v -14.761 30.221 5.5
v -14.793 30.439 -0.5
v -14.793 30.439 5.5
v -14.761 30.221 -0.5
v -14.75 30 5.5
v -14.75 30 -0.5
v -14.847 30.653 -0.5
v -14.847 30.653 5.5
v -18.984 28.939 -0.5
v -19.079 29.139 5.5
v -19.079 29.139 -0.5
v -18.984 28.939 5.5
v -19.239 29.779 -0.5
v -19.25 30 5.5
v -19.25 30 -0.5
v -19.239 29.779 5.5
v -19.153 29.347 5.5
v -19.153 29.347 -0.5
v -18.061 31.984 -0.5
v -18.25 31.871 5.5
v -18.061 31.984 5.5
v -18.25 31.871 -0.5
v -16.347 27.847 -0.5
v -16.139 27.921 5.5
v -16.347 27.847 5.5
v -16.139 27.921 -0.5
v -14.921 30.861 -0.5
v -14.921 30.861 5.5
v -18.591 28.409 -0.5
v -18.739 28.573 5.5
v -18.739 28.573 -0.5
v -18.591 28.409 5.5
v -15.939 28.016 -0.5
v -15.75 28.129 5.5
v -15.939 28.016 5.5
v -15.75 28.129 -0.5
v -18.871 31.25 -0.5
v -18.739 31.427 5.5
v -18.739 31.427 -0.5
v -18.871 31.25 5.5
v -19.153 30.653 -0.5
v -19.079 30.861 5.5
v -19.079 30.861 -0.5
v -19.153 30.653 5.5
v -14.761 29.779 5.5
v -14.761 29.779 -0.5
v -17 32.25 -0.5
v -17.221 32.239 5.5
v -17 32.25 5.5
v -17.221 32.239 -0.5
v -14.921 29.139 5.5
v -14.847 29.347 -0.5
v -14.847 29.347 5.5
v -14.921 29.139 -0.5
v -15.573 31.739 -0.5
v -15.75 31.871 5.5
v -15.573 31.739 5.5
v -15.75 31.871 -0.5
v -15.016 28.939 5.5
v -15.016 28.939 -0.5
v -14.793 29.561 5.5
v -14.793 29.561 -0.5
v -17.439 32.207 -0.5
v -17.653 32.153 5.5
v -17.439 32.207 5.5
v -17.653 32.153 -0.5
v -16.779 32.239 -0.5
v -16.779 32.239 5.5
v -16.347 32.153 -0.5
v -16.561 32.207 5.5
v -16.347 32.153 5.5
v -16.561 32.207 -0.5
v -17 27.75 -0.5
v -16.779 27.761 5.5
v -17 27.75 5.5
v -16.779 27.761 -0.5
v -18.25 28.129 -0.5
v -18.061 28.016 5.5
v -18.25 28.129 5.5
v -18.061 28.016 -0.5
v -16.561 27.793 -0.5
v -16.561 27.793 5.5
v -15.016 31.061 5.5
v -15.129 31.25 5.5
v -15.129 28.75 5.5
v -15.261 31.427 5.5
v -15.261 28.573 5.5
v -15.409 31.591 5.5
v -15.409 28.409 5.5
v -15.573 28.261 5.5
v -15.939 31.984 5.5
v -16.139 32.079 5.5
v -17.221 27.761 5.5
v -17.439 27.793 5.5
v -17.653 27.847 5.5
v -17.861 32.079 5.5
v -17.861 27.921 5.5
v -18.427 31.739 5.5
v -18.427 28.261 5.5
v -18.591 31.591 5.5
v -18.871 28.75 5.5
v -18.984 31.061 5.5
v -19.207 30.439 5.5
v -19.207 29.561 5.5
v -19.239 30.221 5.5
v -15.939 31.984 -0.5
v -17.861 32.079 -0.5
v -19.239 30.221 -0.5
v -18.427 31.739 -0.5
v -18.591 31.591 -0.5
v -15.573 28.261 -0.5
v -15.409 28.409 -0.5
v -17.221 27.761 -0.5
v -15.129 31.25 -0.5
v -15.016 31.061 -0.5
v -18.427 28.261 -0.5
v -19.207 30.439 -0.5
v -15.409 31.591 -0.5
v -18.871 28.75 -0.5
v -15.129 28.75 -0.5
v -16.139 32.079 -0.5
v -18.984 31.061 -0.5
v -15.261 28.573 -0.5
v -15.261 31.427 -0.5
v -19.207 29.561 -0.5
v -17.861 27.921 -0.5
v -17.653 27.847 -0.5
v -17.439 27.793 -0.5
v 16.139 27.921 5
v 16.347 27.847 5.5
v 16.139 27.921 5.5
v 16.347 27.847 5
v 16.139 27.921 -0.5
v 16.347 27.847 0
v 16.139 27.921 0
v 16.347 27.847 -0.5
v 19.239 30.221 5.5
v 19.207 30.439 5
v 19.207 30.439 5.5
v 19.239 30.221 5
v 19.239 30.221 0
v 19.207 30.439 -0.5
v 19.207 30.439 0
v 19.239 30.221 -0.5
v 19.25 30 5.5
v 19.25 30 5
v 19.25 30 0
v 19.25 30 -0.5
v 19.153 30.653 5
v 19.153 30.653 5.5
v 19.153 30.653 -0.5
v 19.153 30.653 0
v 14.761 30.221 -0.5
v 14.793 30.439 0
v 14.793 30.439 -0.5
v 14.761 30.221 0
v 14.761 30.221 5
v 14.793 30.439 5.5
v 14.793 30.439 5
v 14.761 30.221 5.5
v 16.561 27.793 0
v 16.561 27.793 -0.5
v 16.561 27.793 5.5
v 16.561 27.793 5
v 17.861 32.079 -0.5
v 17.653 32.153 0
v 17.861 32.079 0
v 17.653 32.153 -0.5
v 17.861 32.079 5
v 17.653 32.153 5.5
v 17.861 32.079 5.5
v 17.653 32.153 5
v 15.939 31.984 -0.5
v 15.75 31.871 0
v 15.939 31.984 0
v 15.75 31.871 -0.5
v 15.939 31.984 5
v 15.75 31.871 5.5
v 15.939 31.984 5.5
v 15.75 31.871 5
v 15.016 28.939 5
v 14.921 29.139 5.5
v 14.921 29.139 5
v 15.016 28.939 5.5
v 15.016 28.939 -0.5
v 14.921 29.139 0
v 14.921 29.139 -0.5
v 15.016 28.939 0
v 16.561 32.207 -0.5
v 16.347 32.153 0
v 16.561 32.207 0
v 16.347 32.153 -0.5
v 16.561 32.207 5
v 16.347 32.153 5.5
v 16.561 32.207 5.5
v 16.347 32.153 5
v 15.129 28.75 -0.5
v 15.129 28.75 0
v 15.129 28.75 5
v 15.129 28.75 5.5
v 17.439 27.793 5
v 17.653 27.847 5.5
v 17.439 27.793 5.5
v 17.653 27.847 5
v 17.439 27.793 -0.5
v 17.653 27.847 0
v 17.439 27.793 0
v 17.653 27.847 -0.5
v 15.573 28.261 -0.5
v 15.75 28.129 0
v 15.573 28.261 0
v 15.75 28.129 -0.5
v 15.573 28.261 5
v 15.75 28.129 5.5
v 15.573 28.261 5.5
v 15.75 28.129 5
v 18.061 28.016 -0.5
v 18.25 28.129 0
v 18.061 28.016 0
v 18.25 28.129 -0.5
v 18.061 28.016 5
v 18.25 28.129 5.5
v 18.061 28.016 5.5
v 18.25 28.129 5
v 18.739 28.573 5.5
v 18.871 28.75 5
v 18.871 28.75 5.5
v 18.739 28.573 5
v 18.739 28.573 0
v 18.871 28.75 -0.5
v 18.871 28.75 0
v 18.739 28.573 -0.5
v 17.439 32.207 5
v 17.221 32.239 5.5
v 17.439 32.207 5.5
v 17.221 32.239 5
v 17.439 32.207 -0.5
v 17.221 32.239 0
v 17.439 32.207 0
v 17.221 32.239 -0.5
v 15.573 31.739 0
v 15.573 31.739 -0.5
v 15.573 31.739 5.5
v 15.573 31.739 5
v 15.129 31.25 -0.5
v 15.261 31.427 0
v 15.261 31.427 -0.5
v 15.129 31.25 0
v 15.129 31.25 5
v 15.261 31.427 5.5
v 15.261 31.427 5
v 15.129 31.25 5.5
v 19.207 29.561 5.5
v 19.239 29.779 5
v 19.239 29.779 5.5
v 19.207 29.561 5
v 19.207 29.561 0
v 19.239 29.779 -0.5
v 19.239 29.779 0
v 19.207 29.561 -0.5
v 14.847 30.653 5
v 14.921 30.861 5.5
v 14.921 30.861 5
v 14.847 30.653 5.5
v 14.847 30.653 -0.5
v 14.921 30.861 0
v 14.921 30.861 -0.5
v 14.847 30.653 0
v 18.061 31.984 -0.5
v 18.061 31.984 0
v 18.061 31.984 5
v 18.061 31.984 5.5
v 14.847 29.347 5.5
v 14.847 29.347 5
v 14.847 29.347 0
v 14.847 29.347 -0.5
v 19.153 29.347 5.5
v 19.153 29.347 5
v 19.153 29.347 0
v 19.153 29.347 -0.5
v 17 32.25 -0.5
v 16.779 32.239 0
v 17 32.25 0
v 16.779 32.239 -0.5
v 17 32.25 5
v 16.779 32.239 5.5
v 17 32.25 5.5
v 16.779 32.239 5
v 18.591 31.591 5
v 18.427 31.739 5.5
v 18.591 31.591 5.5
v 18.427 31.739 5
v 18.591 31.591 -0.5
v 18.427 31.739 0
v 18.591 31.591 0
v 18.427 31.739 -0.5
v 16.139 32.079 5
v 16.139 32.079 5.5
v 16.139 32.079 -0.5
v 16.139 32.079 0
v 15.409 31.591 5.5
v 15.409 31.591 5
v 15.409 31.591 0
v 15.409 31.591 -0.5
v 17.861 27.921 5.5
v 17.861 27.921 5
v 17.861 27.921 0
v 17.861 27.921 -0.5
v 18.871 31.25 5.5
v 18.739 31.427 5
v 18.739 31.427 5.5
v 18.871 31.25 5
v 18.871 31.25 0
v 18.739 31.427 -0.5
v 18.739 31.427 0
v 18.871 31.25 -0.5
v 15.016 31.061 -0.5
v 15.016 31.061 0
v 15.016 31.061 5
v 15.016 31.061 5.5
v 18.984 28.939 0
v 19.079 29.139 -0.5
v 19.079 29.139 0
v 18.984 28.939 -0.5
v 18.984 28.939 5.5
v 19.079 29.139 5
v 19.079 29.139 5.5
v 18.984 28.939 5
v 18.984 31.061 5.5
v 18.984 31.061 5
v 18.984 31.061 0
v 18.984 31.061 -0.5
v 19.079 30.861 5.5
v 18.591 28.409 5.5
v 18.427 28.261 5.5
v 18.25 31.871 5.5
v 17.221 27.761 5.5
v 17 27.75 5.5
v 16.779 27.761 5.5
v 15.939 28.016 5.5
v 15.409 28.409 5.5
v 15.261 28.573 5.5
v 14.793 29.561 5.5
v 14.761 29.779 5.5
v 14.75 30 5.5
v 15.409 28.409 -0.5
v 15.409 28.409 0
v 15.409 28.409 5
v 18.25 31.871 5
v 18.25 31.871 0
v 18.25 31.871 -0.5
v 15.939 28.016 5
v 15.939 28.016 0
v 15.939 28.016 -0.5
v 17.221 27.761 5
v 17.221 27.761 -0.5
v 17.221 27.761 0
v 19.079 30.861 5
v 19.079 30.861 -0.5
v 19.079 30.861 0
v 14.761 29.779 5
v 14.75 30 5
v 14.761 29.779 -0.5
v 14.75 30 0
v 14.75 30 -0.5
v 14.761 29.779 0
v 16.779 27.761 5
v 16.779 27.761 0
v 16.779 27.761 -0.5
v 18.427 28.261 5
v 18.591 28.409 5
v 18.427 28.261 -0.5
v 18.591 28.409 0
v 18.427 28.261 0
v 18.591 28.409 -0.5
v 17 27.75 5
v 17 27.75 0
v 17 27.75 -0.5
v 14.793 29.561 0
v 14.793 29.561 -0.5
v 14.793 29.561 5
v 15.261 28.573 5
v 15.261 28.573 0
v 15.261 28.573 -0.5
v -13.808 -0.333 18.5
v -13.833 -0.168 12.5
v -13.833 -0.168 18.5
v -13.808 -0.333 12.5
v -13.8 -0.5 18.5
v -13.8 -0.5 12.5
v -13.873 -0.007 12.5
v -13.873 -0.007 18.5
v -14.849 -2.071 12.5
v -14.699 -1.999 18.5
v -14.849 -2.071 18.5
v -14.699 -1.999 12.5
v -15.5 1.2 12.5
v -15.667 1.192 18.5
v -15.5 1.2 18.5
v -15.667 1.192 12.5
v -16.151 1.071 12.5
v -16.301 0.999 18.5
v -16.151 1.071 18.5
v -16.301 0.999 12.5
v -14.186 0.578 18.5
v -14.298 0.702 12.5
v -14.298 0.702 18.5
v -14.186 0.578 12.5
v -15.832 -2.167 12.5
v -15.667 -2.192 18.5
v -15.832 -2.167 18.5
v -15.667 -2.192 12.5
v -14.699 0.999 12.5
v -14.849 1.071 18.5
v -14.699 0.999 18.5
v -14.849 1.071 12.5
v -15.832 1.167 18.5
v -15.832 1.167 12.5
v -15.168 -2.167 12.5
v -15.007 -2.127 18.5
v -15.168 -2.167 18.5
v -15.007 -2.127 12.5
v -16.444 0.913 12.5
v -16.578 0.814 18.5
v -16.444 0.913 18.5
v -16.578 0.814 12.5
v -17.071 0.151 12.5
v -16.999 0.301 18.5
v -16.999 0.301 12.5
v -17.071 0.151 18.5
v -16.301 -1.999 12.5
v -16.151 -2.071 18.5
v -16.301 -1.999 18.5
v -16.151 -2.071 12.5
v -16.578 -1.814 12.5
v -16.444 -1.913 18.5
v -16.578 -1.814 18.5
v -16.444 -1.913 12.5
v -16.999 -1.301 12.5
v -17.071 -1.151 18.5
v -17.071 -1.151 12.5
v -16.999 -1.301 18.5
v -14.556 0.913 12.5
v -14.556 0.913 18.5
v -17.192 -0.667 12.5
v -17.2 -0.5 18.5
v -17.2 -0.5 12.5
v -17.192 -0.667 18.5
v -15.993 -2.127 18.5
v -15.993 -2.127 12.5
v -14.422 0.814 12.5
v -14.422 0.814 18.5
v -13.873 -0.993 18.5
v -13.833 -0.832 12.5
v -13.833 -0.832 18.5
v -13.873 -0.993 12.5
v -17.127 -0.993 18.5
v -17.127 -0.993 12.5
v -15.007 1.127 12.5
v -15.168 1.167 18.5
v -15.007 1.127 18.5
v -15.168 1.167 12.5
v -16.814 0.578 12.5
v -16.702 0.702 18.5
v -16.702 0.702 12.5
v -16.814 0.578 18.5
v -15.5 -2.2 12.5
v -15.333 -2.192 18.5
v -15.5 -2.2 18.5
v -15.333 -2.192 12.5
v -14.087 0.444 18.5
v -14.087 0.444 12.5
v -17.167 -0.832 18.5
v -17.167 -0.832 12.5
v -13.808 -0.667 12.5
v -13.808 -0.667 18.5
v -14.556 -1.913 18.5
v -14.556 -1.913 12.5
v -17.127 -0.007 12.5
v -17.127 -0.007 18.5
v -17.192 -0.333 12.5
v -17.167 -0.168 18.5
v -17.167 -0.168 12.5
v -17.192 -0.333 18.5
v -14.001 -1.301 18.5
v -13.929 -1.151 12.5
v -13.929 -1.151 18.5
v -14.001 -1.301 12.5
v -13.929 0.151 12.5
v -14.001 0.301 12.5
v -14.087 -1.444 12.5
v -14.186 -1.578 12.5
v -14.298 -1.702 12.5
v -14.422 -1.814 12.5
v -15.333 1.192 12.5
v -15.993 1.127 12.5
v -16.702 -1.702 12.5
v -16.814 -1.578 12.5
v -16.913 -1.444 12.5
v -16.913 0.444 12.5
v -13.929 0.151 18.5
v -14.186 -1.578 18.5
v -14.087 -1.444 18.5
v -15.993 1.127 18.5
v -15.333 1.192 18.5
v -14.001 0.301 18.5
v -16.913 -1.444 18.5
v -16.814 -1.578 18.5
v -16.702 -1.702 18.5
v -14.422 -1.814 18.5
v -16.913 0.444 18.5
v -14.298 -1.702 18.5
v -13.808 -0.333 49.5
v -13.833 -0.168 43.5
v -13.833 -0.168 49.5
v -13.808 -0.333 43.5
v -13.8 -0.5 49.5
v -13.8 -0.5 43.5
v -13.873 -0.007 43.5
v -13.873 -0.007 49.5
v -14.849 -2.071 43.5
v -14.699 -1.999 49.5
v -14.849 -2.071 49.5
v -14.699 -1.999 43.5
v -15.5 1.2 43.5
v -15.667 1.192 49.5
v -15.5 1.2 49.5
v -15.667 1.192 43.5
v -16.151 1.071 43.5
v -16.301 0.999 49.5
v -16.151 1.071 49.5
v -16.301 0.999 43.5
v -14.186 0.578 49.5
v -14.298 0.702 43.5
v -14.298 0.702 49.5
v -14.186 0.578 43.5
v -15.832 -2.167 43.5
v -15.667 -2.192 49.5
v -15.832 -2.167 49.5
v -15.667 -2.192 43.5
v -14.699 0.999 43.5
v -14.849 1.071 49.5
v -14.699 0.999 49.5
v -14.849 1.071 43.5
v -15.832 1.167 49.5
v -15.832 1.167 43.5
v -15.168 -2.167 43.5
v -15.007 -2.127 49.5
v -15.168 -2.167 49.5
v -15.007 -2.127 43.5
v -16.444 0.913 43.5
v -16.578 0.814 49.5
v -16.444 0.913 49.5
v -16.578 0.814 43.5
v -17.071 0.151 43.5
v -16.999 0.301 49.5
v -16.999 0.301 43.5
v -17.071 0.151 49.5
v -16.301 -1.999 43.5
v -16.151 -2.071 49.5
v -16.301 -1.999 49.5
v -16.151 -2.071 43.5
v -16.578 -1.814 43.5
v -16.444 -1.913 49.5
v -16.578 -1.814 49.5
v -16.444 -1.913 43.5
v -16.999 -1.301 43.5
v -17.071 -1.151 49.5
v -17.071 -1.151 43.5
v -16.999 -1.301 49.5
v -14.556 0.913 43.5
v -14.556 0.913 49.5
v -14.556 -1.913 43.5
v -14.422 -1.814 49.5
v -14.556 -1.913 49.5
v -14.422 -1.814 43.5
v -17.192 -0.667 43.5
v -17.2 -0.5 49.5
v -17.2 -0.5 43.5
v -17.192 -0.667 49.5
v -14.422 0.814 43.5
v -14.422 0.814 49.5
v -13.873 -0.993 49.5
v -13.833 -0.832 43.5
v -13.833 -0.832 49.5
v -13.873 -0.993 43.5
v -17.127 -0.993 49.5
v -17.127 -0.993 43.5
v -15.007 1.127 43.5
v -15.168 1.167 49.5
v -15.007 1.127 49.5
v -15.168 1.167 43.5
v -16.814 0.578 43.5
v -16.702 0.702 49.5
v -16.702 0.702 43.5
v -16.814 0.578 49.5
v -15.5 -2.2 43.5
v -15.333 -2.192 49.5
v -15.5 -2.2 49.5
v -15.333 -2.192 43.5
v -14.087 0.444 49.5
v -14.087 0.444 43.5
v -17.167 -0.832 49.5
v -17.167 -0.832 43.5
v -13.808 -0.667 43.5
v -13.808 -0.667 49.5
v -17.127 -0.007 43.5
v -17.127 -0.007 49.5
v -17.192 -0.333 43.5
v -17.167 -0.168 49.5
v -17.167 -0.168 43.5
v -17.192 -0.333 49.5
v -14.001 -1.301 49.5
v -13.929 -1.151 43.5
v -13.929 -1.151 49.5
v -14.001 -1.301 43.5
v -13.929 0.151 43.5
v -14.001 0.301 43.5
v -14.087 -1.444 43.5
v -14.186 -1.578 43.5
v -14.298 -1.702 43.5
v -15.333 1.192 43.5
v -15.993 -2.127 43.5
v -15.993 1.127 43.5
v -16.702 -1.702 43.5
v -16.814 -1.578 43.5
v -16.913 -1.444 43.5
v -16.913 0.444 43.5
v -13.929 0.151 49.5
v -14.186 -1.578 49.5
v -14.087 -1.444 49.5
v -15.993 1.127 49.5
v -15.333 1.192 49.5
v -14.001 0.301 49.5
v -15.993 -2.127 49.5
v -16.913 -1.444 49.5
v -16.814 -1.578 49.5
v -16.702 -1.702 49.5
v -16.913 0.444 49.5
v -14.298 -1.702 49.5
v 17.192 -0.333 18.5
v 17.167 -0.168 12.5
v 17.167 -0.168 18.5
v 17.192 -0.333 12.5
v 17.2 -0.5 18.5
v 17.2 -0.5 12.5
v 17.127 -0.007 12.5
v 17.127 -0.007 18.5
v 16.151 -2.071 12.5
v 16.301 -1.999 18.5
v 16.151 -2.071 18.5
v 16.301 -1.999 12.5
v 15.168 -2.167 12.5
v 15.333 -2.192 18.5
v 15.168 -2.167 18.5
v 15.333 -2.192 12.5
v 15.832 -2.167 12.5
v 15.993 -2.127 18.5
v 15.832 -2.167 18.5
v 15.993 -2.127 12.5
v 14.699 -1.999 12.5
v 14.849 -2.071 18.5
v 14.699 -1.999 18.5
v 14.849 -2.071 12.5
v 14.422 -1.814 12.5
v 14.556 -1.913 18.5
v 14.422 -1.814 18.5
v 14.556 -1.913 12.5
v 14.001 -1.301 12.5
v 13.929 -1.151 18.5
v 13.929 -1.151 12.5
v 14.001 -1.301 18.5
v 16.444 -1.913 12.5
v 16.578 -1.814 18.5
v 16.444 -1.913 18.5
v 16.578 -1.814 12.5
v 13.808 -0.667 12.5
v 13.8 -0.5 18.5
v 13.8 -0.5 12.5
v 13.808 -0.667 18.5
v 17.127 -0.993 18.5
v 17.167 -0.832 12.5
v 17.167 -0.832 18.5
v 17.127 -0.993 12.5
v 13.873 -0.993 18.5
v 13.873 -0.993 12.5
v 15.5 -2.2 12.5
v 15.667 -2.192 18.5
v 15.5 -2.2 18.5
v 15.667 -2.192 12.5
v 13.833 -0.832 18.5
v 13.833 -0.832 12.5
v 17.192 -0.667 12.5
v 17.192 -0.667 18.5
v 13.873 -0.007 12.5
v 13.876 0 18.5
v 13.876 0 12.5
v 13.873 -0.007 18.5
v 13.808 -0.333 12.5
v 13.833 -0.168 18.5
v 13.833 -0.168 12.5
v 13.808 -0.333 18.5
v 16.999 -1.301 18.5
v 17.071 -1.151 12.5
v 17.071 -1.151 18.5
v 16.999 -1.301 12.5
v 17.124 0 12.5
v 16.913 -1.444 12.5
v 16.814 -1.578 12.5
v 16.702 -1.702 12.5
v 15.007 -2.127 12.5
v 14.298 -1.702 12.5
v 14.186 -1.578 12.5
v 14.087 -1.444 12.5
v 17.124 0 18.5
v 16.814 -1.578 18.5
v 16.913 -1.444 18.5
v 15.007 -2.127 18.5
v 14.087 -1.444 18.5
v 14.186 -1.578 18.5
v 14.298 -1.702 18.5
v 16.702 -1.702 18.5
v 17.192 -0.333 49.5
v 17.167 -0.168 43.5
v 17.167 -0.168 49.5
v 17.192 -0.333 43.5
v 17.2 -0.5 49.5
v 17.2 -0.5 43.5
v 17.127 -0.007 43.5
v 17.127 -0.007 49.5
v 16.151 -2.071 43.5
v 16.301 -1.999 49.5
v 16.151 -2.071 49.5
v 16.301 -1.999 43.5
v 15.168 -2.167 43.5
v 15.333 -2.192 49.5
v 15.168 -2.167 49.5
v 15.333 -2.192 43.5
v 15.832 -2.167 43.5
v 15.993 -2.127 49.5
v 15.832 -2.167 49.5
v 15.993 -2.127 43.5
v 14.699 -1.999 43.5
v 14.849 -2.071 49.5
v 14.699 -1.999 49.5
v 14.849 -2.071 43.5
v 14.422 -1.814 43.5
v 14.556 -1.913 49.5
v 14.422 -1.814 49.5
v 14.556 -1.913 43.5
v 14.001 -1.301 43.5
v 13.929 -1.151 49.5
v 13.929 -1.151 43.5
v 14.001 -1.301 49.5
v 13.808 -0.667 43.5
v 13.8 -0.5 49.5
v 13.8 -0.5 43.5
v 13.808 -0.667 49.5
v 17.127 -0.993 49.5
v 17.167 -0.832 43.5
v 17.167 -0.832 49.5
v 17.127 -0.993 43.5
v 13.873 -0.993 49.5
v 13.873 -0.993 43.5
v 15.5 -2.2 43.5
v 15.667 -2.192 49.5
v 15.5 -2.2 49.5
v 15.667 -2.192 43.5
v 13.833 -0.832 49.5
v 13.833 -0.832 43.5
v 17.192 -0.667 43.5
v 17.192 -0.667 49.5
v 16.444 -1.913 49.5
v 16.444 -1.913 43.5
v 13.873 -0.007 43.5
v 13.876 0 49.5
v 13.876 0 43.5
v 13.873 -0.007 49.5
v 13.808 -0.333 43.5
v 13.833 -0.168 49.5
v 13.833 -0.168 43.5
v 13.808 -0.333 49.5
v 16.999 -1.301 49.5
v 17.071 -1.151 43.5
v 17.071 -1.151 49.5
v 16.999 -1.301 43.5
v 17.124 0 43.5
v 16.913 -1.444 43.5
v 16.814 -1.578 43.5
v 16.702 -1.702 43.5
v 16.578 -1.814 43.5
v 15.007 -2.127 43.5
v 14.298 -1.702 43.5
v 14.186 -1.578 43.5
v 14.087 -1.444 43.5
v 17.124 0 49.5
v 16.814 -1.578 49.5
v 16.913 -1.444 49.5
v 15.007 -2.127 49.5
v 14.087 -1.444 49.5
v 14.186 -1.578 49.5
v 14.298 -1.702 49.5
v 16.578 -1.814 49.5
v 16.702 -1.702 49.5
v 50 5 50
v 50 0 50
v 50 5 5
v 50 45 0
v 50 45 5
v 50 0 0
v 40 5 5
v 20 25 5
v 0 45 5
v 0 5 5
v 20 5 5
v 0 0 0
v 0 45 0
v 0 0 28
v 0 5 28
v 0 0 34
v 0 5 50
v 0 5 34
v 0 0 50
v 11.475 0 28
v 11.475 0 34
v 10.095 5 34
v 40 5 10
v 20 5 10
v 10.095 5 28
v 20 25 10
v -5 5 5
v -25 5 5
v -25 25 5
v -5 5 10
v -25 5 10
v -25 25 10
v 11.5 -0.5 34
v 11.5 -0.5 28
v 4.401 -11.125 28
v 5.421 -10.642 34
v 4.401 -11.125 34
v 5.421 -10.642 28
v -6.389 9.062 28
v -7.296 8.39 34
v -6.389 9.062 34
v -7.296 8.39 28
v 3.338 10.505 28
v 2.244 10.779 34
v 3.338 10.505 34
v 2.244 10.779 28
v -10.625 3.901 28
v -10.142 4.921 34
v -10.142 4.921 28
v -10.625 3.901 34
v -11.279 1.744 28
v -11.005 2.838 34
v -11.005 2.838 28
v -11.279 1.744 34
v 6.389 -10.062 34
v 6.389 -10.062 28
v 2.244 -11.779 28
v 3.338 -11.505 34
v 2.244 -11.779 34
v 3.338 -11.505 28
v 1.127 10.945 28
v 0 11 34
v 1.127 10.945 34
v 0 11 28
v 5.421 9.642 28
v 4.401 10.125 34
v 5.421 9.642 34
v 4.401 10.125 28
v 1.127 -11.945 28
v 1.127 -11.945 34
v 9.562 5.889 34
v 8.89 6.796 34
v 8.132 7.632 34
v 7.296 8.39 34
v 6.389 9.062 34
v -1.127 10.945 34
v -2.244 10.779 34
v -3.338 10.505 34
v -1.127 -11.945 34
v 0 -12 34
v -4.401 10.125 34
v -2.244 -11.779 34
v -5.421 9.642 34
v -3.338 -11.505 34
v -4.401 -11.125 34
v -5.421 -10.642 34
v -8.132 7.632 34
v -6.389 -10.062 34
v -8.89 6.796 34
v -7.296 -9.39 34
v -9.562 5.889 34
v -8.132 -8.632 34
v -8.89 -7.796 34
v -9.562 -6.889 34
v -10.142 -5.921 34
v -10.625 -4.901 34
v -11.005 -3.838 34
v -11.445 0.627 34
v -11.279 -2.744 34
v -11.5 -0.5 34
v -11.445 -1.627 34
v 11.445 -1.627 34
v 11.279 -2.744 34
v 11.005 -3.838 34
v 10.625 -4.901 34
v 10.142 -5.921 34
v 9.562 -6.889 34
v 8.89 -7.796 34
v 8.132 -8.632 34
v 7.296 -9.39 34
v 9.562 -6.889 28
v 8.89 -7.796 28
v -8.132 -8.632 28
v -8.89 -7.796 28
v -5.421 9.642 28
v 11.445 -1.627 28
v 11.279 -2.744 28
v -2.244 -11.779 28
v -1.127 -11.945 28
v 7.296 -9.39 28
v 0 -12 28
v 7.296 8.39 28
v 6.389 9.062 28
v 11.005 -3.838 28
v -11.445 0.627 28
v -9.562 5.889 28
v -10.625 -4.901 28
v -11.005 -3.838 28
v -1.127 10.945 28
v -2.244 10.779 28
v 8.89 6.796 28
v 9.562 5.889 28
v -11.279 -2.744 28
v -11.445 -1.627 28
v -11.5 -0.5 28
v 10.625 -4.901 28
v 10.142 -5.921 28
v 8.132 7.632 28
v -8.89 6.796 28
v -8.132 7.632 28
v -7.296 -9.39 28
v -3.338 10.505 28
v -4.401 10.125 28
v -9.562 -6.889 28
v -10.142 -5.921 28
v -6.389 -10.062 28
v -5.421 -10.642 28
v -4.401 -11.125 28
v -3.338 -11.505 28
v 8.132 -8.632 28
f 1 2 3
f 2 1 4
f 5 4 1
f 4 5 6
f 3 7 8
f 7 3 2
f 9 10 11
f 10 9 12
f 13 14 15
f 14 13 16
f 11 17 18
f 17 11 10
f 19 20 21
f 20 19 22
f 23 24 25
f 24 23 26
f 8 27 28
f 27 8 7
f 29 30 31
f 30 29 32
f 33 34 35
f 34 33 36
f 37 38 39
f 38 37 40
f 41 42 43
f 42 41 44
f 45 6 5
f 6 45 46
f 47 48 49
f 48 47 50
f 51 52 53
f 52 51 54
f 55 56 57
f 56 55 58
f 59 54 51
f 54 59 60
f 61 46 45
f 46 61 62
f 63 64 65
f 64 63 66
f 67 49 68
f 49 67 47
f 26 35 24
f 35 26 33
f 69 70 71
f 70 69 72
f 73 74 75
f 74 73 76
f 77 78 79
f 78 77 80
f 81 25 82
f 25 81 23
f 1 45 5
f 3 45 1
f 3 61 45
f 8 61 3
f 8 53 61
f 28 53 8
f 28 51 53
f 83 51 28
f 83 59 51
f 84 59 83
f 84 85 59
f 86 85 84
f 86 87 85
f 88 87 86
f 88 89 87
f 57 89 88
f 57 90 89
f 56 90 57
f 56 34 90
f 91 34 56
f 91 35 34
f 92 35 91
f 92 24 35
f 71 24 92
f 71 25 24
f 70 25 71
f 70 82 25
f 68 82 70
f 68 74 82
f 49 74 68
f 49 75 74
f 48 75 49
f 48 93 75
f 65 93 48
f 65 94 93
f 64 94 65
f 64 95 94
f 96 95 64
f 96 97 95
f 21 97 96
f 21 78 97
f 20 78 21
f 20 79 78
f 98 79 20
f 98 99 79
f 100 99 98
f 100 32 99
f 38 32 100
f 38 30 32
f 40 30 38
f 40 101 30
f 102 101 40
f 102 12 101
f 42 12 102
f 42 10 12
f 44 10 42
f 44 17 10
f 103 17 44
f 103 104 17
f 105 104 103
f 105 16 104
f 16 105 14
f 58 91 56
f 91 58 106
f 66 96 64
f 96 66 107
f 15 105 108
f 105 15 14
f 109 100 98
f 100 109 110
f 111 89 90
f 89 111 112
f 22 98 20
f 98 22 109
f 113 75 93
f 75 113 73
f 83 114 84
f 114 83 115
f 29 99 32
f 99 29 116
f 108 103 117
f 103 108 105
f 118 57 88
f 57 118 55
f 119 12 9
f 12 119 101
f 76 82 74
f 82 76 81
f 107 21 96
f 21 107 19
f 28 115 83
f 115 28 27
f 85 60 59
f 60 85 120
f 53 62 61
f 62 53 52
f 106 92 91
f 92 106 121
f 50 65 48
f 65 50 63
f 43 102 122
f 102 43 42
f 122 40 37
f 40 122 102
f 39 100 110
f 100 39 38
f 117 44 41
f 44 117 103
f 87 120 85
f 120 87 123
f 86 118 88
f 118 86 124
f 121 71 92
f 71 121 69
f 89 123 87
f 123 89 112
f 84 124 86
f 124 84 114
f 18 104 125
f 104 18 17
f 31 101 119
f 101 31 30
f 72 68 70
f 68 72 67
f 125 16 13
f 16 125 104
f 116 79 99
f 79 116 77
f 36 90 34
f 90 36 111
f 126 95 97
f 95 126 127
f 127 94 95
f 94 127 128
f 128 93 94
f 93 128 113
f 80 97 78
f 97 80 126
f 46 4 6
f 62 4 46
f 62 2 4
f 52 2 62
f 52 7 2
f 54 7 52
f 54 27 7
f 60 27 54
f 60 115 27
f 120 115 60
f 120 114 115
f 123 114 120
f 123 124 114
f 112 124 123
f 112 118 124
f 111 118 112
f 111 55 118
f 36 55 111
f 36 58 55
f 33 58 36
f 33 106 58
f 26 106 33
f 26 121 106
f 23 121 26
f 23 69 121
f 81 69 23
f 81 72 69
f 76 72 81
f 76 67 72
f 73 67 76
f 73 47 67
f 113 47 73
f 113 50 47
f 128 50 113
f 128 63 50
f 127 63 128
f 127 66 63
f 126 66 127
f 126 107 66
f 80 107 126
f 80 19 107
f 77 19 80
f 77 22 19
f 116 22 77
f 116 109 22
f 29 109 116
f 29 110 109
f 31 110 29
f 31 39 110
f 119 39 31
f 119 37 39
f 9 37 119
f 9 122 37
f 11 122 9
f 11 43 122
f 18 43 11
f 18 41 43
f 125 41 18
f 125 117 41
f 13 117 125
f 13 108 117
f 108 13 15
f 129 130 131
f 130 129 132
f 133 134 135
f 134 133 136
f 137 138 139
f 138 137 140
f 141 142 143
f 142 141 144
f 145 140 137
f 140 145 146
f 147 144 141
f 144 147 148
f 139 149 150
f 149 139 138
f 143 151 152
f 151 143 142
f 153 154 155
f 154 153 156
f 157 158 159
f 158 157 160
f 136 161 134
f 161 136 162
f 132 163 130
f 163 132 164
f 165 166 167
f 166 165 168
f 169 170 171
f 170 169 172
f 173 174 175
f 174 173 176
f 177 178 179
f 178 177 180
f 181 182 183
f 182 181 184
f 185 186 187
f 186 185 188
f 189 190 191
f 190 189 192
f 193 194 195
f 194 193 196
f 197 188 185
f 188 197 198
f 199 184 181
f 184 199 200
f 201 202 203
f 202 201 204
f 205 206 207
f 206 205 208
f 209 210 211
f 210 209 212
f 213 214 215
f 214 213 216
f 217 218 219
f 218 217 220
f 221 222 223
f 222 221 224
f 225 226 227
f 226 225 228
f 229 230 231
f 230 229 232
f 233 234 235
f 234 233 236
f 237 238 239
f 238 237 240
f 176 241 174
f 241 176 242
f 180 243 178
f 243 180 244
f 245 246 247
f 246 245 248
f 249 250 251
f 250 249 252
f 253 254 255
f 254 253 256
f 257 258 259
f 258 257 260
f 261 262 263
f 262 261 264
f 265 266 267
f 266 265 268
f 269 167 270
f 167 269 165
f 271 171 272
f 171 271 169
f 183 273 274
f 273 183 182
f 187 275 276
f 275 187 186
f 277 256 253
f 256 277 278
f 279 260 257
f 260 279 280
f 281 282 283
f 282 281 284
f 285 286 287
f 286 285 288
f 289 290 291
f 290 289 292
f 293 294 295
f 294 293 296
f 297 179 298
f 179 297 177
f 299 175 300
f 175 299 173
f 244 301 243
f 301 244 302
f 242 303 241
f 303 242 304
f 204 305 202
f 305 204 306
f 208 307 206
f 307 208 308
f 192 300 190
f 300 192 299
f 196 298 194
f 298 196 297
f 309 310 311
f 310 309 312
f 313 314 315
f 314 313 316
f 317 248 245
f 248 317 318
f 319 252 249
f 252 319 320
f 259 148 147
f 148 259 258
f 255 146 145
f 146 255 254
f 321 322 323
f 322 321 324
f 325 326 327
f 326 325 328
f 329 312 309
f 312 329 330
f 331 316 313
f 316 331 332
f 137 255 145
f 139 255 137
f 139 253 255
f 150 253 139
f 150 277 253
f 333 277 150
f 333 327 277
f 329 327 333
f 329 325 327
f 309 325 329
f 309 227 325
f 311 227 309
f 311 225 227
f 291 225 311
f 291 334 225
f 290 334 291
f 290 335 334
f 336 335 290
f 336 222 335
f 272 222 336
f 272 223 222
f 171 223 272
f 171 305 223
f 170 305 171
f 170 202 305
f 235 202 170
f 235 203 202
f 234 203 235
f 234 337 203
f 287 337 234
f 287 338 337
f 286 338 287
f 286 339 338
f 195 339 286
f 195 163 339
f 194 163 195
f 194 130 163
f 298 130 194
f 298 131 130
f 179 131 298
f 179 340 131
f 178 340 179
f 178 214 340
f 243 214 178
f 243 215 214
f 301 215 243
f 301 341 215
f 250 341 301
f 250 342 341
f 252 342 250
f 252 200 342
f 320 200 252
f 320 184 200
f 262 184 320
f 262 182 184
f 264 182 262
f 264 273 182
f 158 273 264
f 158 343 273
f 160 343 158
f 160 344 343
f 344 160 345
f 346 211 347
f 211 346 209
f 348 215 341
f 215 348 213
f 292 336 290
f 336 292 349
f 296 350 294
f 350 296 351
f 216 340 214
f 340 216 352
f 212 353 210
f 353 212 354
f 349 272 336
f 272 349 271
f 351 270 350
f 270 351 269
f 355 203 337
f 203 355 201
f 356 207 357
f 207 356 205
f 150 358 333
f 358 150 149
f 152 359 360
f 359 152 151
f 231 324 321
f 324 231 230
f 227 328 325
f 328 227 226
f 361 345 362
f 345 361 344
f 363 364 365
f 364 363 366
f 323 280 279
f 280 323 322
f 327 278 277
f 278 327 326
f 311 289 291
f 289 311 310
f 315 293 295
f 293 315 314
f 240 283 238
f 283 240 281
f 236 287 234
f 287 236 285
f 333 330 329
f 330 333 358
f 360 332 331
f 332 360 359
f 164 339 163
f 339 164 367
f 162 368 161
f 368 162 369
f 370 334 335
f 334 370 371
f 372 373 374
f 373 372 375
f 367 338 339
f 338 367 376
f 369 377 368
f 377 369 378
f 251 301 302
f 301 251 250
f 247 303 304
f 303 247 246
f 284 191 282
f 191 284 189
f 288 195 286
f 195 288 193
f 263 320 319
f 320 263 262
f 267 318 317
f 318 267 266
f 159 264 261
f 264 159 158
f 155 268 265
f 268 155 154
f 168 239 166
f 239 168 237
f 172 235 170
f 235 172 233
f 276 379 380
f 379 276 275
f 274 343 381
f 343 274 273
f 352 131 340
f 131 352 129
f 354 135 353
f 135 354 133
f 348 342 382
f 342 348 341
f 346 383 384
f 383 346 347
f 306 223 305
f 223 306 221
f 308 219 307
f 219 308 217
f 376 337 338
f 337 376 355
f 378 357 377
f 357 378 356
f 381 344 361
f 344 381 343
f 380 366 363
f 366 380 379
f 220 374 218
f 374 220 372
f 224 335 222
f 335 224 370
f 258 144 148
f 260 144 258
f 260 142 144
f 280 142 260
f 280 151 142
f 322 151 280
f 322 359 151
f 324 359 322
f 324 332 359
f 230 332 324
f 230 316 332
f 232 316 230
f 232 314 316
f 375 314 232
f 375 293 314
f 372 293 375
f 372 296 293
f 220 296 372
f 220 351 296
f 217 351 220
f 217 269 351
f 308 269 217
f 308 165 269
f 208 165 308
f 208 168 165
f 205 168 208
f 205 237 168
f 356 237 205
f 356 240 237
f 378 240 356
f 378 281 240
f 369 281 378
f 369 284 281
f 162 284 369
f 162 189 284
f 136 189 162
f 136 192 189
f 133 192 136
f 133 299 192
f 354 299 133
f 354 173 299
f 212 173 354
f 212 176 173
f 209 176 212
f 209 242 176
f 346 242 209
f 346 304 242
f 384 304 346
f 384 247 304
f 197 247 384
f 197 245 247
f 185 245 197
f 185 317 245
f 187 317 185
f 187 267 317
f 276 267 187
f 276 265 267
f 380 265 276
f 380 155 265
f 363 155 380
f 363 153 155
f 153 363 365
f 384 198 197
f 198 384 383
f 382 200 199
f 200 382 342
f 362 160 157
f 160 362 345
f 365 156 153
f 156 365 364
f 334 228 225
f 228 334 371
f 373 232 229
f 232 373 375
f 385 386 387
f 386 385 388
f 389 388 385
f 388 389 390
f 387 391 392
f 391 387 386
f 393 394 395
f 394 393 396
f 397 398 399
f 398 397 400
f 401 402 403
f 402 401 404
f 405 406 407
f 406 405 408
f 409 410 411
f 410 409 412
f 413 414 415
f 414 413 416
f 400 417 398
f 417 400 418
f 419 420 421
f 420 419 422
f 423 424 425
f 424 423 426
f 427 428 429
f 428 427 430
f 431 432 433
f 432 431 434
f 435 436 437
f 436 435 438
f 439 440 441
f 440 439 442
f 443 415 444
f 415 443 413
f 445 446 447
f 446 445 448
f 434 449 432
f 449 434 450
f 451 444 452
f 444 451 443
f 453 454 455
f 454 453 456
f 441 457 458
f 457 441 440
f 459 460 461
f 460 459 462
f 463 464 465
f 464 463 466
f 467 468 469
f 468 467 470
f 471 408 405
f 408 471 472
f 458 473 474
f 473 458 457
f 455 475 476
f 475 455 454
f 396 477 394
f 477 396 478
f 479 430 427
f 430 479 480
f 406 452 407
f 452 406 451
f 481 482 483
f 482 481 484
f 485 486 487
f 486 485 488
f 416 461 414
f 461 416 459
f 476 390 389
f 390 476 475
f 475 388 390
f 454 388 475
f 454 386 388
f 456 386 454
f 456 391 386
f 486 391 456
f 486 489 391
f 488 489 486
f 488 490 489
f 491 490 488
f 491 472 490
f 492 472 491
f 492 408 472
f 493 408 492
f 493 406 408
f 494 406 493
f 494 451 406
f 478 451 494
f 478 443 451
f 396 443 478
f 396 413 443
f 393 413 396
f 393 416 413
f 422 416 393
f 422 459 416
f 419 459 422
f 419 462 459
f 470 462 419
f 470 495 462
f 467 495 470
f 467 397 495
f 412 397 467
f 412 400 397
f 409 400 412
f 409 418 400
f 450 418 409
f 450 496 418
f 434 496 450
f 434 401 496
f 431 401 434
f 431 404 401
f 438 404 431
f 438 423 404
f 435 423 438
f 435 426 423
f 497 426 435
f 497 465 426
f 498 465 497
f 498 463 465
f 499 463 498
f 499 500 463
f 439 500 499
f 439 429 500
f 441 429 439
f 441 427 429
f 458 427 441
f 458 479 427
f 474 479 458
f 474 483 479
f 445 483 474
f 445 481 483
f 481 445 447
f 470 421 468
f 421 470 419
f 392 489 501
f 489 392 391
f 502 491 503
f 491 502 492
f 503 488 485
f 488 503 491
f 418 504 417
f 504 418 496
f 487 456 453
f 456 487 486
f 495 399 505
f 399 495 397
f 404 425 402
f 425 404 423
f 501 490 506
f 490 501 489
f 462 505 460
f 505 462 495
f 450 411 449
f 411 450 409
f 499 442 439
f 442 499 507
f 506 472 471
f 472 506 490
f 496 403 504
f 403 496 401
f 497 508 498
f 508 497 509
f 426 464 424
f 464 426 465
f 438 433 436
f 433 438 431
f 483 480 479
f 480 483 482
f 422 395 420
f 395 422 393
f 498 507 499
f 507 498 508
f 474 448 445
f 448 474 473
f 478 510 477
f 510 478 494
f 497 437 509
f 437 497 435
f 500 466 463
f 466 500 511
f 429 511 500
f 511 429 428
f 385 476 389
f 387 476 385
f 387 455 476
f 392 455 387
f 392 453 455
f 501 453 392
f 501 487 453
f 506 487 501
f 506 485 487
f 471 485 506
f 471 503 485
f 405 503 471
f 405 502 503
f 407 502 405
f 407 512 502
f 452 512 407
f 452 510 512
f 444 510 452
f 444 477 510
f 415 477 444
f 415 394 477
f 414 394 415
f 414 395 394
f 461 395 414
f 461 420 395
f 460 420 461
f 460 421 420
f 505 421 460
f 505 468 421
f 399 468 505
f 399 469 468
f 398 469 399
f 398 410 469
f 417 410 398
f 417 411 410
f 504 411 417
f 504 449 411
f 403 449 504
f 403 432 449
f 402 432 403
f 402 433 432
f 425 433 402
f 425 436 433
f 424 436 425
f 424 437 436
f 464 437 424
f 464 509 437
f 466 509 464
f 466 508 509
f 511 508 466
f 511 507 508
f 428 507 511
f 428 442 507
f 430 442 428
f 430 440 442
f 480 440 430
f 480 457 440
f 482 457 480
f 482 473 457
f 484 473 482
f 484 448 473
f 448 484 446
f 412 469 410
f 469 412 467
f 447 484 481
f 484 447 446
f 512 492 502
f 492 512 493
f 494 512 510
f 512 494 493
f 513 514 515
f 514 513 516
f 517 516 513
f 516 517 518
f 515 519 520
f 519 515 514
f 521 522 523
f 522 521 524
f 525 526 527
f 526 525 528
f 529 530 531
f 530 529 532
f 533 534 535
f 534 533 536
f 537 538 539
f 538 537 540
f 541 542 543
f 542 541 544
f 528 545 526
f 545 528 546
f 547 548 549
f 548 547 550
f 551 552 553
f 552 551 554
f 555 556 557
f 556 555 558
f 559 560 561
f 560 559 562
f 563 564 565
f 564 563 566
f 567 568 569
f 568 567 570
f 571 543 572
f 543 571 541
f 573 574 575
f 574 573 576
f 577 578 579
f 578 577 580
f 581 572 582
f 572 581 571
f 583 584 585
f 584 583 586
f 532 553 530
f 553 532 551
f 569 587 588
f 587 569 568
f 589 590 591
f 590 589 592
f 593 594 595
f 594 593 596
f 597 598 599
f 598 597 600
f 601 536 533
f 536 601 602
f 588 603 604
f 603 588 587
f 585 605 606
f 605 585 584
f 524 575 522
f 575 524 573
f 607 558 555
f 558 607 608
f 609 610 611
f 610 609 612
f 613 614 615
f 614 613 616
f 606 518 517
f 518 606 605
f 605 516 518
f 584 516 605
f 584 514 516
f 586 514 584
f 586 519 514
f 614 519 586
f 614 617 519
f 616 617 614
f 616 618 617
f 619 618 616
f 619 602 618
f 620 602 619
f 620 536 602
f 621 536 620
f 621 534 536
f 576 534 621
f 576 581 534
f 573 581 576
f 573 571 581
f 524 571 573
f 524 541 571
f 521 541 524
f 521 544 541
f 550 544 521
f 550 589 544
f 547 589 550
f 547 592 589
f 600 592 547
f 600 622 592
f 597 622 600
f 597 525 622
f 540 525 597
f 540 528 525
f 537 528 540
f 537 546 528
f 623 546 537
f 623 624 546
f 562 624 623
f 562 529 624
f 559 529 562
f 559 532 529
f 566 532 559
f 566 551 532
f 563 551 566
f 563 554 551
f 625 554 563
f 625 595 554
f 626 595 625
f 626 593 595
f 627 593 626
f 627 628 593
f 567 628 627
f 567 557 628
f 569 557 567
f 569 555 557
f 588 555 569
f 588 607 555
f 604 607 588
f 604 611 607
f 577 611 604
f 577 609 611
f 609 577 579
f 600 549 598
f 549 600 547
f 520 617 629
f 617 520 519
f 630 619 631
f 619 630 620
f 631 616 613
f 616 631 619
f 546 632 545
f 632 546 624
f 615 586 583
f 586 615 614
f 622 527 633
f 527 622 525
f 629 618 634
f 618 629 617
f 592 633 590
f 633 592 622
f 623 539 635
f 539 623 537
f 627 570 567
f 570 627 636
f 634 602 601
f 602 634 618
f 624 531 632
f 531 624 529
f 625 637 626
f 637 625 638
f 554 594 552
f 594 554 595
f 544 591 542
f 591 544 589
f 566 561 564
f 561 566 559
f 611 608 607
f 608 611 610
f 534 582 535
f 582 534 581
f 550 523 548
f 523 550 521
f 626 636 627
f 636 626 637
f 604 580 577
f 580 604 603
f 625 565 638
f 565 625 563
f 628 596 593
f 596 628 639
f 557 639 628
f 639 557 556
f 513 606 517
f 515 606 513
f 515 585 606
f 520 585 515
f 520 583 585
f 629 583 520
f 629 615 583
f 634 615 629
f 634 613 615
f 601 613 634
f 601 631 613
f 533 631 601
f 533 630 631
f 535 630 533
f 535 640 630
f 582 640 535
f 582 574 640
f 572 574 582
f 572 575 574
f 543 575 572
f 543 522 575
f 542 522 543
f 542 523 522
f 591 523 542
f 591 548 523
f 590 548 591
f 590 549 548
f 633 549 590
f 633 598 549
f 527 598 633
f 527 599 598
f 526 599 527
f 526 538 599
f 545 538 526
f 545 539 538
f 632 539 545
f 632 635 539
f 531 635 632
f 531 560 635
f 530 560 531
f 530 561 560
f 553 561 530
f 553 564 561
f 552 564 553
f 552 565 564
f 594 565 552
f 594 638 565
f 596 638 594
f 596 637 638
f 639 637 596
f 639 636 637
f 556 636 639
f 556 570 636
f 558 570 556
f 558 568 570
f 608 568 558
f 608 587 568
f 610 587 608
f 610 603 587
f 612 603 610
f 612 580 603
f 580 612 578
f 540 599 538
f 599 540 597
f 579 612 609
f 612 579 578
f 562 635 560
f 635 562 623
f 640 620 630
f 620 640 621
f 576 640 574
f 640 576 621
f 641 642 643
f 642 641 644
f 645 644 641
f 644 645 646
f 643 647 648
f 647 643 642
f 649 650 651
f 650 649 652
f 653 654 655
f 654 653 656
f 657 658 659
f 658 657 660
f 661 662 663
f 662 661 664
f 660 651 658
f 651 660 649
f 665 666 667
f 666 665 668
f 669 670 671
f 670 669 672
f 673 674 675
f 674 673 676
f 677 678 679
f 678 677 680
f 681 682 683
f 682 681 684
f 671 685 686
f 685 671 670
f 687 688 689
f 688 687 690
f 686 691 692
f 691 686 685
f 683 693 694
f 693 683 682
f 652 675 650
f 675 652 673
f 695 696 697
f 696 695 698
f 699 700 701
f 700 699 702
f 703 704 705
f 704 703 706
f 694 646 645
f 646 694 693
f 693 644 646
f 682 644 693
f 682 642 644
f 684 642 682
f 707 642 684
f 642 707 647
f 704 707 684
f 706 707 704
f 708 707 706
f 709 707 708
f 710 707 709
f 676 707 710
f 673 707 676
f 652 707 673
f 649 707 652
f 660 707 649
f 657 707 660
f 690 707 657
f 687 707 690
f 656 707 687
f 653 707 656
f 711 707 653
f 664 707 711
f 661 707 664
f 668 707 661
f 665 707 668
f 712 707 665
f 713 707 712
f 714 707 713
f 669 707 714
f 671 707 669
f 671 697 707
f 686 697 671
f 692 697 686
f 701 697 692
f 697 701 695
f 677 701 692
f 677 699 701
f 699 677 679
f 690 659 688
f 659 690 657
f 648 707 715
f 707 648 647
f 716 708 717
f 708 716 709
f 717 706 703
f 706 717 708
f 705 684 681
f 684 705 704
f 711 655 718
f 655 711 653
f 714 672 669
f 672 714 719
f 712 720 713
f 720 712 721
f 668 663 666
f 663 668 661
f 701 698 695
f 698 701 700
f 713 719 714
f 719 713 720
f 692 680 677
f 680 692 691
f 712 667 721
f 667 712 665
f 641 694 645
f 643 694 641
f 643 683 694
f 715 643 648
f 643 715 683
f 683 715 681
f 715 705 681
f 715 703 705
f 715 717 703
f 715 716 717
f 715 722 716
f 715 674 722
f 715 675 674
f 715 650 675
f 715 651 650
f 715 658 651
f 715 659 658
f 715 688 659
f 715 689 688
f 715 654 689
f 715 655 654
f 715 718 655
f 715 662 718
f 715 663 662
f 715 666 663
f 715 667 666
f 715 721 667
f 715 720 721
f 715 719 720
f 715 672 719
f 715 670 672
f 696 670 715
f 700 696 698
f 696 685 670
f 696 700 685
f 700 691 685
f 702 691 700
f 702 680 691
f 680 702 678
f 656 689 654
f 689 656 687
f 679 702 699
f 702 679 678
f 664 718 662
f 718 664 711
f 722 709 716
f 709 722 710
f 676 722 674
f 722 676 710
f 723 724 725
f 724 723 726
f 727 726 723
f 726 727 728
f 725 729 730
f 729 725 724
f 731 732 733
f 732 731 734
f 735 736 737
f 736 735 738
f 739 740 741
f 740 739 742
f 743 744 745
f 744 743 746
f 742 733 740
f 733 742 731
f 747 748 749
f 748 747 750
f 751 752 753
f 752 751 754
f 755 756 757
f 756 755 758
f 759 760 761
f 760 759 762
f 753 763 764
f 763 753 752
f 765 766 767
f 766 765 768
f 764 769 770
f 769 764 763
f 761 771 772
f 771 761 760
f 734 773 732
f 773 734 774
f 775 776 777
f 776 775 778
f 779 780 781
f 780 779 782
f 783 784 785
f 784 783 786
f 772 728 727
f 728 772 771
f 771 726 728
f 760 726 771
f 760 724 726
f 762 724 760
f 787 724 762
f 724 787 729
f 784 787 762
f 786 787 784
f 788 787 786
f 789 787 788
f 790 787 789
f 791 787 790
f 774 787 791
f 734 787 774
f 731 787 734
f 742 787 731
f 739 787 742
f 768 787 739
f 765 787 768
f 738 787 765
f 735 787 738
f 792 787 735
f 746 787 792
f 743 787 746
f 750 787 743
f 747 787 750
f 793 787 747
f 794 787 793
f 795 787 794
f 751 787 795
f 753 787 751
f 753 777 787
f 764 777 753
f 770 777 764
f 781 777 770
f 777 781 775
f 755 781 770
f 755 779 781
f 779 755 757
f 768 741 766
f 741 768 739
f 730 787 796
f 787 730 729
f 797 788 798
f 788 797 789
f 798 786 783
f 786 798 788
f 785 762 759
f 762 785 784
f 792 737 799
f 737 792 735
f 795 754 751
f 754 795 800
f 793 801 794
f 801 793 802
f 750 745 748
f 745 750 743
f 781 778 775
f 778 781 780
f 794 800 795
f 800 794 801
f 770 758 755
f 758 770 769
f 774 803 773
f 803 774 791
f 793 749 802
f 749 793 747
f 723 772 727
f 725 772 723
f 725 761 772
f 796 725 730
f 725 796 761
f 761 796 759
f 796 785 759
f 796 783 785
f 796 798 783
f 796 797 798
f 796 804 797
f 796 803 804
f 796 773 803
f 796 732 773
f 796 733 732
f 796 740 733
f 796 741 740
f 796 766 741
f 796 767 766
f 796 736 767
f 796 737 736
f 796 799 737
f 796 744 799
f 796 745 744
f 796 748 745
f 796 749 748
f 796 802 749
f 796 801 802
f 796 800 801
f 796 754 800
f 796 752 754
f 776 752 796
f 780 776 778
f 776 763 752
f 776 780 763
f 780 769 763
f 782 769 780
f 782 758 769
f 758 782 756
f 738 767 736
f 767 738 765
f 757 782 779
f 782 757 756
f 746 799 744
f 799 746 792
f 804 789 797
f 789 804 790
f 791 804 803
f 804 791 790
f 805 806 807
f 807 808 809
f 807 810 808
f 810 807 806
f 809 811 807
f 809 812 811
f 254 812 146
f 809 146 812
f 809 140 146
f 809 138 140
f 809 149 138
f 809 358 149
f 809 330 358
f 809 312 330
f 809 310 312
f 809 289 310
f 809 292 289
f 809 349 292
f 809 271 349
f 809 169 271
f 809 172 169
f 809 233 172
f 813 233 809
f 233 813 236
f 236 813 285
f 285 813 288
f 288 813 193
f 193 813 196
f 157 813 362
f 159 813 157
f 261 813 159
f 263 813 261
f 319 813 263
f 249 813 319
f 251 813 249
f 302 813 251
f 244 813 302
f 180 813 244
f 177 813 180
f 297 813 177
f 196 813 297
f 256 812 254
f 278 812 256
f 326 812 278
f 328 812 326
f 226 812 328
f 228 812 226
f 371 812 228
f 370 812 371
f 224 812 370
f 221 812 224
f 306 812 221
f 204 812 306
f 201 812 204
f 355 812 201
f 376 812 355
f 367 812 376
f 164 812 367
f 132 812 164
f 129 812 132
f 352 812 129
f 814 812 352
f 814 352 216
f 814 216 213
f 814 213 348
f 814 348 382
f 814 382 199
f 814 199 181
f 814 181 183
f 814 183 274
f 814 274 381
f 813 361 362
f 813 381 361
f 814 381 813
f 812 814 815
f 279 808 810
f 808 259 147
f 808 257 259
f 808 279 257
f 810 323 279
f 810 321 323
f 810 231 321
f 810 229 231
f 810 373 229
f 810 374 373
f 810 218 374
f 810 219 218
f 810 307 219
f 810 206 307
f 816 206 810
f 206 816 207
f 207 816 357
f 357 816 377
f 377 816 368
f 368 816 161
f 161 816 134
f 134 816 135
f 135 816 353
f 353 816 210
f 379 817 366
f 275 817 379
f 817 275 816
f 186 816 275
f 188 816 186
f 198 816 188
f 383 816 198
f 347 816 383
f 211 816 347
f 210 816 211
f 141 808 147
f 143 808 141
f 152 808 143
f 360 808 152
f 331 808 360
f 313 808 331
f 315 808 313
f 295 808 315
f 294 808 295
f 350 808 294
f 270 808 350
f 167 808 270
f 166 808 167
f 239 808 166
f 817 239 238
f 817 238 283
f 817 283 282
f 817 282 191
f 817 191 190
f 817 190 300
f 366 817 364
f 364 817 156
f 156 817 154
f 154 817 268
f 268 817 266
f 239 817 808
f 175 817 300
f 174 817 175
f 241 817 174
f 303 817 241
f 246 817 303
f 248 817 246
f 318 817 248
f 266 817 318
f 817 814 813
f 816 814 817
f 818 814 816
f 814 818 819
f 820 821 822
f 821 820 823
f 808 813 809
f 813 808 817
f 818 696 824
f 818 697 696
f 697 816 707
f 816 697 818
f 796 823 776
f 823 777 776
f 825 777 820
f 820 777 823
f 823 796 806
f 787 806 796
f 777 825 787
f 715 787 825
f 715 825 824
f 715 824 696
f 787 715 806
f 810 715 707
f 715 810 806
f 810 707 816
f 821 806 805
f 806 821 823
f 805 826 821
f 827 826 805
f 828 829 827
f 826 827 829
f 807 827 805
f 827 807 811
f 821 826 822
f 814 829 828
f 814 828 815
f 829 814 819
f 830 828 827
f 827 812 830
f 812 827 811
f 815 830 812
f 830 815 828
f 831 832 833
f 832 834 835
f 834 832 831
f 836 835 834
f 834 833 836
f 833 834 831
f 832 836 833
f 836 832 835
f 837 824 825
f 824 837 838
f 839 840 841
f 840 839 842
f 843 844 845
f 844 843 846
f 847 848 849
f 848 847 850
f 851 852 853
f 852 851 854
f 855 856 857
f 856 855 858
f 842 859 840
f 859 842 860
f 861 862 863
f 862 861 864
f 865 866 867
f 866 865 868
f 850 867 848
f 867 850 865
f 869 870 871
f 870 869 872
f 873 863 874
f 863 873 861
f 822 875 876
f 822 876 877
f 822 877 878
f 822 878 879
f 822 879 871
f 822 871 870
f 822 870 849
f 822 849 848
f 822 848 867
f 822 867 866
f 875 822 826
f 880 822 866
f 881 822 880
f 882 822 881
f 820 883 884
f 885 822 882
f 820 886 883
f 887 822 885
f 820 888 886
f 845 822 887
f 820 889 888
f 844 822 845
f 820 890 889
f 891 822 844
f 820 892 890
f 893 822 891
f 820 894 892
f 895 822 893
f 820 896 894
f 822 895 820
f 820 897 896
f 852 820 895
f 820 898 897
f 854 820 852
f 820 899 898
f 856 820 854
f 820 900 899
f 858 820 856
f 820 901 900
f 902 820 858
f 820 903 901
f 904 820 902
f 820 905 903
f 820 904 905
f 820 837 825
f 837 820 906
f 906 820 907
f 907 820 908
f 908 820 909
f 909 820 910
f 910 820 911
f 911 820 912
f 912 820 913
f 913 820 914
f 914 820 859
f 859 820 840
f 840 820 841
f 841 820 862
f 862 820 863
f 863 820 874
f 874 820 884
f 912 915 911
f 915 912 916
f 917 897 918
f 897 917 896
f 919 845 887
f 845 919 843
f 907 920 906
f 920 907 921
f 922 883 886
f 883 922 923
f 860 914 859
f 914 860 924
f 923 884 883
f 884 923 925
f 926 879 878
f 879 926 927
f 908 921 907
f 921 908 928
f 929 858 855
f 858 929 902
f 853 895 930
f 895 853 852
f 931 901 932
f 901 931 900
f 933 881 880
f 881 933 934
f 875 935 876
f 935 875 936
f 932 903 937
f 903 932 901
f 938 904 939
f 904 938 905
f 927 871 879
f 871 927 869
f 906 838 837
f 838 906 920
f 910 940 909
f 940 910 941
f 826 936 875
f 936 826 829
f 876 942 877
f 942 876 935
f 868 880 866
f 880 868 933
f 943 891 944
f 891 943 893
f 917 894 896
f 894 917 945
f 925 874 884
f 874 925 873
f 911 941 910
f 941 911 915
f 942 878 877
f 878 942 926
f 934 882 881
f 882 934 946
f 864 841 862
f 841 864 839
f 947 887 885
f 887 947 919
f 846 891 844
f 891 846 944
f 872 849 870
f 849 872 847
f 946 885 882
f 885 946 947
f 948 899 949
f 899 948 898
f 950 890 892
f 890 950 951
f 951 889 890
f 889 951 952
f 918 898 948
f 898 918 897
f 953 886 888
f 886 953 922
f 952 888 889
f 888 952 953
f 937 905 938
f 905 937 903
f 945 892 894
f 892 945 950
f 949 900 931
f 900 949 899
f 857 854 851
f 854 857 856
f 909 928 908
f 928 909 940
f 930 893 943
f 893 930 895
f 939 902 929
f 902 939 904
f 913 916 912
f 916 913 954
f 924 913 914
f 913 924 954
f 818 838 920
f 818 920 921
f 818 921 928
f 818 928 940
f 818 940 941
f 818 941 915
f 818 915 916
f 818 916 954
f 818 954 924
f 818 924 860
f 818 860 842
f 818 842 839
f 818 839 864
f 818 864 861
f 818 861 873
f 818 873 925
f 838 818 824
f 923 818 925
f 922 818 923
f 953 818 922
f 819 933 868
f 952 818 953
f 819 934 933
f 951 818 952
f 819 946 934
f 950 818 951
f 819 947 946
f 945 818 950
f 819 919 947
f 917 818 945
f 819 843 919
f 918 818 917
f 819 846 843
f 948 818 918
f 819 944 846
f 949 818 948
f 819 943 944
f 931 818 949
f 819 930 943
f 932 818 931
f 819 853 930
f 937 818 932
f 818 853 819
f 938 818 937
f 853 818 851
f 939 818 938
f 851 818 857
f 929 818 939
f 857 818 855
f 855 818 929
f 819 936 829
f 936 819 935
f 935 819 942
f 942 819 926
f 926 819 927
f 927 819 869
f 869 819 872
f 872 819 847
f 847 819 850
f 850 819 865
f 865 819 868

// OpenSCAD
// === NEMA 17 Stepper Motor Mounting Bracket ===
// Print orientation: base plate on bed (XY plane, z=0)

// --- Base plate dimensions ---
base_x_half = 25;       // Half-width in X (total 50 mm)
base_y = 45;            // Depth in Y (0 to 45 mm)
base_z = 5;             // Thickness in Z

// --- Base plate mounting holes (M4) ---
m4_dia = 4.5;           // M4 hole diameter
m4_x = 17;              // X offset of M4 holes
m4_y = 30;              // Y position of M4 holes

// --- Vertical motor plate dimensions ---
motor_plate_x_half = 25;  // Same width as base
motor_plate_y = 5;        // Thickness (along Y, extends from y=0 to y=5)
motor_plate_z = 50;       // Height

// --- Motor centring boss hole ---
boss_dia = 23;            // Boss hole diameter
boss_x = 0;               // Centre X
boss_z = 28;              // Centre Z

// --- M3 screw holes for motor (31 mm square pattern) ---
m3_dia = 3.4;             // M3 hole diameter
m3_pattern = 31;          // Square pattern size
m3_offset = m3_pattern / 2;  // Half-pattern offset

// --- Triangular gussets ---
gusset_thickness = 5;     // Thickness in X (along base width)
gusset_leg_y = 20;        // Leg along +Y
gusset_leg_z = 20;        // Leg along +Z
gusset_x_start = 20;      // Inner X edge of gusset (right side)

// --- Global fineness ---
$fn = 64;

// === Build the part ===
union() {
    // --- Base plate ---
    translate([0, 0, 0])
        cube([base_x_half * 2, base_y, base_z], center = false);

    // --- Vertical motor plate ---
    // Extends from y=0 to y=5, z=0 to z=50, x=-25 to 25
    translate([0, 0, 0])
        cube([motor_plate_x_half * 2, motor_plate_y, motor_plate_z], center = false);

    // --- Triangular gussets ---
    // Right gusset: right triangle in YZ plane, right angle at (y=5, z=5)
    // Legs: +Y from 5 to 25, +Z from 5 to 25
    // Positioned at x = 20 to 25
    translate([gusset_x_start, 5, 5])
        linear_extrude(height = gusset_thickness, center = false)
            polygon([[0, 0], [gusset_leg_y, 0], [0, gusset_leg_z]]);

    // Left gusset: mirrored across X=0
    translate([-gusset_x_start - gusset_thickness, 5, 5])
        linear_extrude(height = gusset_thickness, center = false)
            polygon([[0, 0], [gusset_leg_y, 0], [0, gusset_leg_z]]);

    // --- Cut: M4 through-holes in base plate ---
    // These go through the base plate (z=0 to z=5) and into the motor plate
    // Extend past both faces by 0.5 mm
    for (sign = [-1, 1]) {
        translate([sign * m4_x, m4_y, -0.5])
            cylinder(d = m4_dia, h = base_z + 1, center = false);
    }

    // --- Cut: Boss hole through motor plate (along Y) ---
    // Centre at (x=0, z=28), along Y from y=0 to y=5
    // Extend past Y faces by 0.5 mm
    translate([boss_x, -0.5, boss_z])
        cylinder(d = boss_dia, h = motor_plate_y + 1, center = false, rotate = [90, 0, 0]);

    // --- Cut: M3 screw holes for motor (4 holes on 31 mm square pattern) ---
    // Centred on boss hole at (x=0, z=28)
    for (sx = [-1, 1]) {
        for (sz = [-1, 1]) {
            translate([sx * m3_offset, -0.5, boss_z + sz * m3_offset])
                cylinder(d = m3_dia, h = motor_plate_y + 1, center = false, rotate = [90, 0, 0]);
        }
    }
}
